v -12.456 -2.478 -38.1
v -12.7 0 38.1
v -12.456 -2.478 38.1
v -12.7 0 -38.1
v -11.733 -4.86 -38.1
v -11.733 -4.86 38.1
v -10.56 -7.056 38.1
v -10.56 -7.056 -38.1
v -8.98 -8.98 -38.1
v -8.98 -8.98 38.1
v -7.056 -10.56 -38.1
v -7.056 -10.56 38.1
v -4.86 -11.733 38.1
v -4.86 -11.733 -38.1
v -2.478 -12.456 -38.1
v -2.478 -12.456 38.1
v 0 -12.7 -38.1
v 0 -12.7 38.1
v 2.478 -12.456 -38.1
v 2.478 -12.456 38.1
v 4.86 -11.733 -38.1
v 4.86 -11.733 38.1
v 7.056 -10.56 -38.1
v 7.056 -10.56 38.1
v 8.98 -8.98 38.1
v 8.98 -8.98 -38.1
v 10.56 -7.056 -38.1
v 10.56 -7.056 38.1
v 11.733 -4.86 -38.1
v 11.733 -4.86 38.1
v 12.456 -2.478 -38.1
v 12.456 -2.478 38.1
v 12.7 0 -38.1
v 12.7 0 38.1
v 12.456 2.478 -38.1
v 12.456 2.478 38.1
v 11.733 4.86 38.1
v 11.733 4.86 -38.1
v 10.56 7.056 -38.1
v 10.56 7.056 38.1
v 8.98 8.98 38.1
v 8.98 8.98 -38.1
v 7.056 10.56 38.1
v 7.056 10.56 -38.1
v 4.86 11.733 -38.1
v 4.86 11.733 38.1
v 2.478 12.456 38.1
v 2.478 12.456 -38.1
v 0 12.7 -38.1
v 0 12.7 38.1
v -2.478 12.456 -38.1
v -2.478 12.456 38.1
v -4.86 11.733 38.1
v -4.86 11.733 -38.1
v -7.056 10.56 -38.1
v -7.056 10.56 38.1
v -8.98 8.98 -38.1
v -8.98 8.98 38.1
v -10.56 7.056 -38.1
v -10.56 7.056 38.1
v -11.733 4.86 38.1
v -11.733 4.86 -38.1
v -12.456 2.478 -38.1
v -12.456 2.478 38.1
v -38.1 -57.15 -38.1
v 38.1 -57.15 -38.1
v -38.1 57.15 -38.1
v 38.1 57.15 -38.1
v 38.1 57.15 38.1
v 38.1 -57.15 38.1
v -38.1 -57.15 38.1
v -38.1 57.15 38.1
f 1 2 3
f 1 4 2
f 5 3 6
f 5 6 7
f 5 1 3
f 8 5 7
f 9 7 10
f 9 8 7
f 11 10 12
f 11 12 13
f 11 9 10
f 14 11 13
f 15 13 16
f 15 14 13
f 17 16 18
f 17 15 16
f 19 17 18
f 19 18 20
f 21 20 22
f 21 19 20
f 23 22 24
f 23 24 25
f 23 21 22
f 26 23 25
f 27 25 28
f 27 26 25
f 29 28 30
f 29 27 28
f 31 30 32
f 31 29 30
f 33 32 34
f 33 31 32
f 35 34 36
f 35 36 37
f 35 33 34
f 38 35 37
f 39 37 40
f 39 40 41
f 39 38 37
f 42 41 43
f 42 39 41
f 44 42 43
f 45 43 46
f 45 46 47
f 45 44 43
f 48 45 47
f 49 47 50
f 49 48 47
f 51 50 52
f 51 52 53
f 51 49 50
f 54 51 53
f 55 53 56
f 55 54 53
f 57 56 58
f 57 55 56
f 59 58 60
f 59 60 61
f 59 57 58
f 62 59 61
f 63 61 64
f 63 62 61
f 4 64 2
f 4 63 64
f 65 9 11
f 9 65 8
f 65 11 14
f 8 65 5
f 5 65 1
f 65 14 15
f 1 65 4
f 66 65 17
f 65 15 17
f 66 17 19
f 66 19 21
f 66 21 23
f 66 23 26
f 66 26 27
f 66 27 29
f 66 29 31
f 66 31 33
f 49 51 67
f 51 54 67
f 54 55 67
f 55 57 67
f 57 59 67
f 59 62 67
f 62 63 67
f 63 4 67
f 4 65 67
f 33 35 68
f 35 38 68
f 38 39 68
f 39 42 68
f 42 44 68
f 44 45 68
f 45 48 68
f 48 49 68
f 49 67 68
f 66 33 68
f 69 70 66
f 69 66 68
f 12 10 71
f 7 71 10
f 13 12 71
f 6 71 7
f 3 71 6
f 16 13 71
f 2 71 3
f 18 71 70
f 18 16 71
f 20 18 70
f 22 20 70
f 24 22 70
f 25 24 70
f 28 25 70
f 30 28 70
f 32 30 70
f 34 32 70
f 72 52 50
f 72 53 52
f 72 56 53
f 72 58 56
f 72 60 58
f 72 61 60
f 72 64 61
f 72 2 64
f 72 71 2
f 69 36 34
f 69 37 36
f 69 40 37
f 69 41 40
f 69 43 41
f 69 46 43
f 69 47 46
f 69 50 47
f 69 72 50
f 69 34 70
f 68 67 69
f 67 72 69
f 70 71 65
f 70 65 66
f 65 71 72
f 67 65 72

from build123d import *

# Parameters (mm, degrees)
SKETCH1_W           = 76.2
SKETCH1_H           = 114.3
SKETCH1_R           = 12.7
BOSS_EXTRUDE1_DEPTH = 38.1


with BuildPart() as part:
    # Sketch1 → Boss-Extrude1 (new, symmetric)
    with BuildSketch(Plane.XY):
        Rectangle(SKETCH1_W, SKETCH1_H)
        with Locations(Location((0, 0, 0), (0, 0, 180))):
            Circle(SKETCH1_R, mode=Mode.SUBTRACT)
    extrude(amount=BOSS_EXTRUDE1_DEPTH, both=True)


solid = part.part
